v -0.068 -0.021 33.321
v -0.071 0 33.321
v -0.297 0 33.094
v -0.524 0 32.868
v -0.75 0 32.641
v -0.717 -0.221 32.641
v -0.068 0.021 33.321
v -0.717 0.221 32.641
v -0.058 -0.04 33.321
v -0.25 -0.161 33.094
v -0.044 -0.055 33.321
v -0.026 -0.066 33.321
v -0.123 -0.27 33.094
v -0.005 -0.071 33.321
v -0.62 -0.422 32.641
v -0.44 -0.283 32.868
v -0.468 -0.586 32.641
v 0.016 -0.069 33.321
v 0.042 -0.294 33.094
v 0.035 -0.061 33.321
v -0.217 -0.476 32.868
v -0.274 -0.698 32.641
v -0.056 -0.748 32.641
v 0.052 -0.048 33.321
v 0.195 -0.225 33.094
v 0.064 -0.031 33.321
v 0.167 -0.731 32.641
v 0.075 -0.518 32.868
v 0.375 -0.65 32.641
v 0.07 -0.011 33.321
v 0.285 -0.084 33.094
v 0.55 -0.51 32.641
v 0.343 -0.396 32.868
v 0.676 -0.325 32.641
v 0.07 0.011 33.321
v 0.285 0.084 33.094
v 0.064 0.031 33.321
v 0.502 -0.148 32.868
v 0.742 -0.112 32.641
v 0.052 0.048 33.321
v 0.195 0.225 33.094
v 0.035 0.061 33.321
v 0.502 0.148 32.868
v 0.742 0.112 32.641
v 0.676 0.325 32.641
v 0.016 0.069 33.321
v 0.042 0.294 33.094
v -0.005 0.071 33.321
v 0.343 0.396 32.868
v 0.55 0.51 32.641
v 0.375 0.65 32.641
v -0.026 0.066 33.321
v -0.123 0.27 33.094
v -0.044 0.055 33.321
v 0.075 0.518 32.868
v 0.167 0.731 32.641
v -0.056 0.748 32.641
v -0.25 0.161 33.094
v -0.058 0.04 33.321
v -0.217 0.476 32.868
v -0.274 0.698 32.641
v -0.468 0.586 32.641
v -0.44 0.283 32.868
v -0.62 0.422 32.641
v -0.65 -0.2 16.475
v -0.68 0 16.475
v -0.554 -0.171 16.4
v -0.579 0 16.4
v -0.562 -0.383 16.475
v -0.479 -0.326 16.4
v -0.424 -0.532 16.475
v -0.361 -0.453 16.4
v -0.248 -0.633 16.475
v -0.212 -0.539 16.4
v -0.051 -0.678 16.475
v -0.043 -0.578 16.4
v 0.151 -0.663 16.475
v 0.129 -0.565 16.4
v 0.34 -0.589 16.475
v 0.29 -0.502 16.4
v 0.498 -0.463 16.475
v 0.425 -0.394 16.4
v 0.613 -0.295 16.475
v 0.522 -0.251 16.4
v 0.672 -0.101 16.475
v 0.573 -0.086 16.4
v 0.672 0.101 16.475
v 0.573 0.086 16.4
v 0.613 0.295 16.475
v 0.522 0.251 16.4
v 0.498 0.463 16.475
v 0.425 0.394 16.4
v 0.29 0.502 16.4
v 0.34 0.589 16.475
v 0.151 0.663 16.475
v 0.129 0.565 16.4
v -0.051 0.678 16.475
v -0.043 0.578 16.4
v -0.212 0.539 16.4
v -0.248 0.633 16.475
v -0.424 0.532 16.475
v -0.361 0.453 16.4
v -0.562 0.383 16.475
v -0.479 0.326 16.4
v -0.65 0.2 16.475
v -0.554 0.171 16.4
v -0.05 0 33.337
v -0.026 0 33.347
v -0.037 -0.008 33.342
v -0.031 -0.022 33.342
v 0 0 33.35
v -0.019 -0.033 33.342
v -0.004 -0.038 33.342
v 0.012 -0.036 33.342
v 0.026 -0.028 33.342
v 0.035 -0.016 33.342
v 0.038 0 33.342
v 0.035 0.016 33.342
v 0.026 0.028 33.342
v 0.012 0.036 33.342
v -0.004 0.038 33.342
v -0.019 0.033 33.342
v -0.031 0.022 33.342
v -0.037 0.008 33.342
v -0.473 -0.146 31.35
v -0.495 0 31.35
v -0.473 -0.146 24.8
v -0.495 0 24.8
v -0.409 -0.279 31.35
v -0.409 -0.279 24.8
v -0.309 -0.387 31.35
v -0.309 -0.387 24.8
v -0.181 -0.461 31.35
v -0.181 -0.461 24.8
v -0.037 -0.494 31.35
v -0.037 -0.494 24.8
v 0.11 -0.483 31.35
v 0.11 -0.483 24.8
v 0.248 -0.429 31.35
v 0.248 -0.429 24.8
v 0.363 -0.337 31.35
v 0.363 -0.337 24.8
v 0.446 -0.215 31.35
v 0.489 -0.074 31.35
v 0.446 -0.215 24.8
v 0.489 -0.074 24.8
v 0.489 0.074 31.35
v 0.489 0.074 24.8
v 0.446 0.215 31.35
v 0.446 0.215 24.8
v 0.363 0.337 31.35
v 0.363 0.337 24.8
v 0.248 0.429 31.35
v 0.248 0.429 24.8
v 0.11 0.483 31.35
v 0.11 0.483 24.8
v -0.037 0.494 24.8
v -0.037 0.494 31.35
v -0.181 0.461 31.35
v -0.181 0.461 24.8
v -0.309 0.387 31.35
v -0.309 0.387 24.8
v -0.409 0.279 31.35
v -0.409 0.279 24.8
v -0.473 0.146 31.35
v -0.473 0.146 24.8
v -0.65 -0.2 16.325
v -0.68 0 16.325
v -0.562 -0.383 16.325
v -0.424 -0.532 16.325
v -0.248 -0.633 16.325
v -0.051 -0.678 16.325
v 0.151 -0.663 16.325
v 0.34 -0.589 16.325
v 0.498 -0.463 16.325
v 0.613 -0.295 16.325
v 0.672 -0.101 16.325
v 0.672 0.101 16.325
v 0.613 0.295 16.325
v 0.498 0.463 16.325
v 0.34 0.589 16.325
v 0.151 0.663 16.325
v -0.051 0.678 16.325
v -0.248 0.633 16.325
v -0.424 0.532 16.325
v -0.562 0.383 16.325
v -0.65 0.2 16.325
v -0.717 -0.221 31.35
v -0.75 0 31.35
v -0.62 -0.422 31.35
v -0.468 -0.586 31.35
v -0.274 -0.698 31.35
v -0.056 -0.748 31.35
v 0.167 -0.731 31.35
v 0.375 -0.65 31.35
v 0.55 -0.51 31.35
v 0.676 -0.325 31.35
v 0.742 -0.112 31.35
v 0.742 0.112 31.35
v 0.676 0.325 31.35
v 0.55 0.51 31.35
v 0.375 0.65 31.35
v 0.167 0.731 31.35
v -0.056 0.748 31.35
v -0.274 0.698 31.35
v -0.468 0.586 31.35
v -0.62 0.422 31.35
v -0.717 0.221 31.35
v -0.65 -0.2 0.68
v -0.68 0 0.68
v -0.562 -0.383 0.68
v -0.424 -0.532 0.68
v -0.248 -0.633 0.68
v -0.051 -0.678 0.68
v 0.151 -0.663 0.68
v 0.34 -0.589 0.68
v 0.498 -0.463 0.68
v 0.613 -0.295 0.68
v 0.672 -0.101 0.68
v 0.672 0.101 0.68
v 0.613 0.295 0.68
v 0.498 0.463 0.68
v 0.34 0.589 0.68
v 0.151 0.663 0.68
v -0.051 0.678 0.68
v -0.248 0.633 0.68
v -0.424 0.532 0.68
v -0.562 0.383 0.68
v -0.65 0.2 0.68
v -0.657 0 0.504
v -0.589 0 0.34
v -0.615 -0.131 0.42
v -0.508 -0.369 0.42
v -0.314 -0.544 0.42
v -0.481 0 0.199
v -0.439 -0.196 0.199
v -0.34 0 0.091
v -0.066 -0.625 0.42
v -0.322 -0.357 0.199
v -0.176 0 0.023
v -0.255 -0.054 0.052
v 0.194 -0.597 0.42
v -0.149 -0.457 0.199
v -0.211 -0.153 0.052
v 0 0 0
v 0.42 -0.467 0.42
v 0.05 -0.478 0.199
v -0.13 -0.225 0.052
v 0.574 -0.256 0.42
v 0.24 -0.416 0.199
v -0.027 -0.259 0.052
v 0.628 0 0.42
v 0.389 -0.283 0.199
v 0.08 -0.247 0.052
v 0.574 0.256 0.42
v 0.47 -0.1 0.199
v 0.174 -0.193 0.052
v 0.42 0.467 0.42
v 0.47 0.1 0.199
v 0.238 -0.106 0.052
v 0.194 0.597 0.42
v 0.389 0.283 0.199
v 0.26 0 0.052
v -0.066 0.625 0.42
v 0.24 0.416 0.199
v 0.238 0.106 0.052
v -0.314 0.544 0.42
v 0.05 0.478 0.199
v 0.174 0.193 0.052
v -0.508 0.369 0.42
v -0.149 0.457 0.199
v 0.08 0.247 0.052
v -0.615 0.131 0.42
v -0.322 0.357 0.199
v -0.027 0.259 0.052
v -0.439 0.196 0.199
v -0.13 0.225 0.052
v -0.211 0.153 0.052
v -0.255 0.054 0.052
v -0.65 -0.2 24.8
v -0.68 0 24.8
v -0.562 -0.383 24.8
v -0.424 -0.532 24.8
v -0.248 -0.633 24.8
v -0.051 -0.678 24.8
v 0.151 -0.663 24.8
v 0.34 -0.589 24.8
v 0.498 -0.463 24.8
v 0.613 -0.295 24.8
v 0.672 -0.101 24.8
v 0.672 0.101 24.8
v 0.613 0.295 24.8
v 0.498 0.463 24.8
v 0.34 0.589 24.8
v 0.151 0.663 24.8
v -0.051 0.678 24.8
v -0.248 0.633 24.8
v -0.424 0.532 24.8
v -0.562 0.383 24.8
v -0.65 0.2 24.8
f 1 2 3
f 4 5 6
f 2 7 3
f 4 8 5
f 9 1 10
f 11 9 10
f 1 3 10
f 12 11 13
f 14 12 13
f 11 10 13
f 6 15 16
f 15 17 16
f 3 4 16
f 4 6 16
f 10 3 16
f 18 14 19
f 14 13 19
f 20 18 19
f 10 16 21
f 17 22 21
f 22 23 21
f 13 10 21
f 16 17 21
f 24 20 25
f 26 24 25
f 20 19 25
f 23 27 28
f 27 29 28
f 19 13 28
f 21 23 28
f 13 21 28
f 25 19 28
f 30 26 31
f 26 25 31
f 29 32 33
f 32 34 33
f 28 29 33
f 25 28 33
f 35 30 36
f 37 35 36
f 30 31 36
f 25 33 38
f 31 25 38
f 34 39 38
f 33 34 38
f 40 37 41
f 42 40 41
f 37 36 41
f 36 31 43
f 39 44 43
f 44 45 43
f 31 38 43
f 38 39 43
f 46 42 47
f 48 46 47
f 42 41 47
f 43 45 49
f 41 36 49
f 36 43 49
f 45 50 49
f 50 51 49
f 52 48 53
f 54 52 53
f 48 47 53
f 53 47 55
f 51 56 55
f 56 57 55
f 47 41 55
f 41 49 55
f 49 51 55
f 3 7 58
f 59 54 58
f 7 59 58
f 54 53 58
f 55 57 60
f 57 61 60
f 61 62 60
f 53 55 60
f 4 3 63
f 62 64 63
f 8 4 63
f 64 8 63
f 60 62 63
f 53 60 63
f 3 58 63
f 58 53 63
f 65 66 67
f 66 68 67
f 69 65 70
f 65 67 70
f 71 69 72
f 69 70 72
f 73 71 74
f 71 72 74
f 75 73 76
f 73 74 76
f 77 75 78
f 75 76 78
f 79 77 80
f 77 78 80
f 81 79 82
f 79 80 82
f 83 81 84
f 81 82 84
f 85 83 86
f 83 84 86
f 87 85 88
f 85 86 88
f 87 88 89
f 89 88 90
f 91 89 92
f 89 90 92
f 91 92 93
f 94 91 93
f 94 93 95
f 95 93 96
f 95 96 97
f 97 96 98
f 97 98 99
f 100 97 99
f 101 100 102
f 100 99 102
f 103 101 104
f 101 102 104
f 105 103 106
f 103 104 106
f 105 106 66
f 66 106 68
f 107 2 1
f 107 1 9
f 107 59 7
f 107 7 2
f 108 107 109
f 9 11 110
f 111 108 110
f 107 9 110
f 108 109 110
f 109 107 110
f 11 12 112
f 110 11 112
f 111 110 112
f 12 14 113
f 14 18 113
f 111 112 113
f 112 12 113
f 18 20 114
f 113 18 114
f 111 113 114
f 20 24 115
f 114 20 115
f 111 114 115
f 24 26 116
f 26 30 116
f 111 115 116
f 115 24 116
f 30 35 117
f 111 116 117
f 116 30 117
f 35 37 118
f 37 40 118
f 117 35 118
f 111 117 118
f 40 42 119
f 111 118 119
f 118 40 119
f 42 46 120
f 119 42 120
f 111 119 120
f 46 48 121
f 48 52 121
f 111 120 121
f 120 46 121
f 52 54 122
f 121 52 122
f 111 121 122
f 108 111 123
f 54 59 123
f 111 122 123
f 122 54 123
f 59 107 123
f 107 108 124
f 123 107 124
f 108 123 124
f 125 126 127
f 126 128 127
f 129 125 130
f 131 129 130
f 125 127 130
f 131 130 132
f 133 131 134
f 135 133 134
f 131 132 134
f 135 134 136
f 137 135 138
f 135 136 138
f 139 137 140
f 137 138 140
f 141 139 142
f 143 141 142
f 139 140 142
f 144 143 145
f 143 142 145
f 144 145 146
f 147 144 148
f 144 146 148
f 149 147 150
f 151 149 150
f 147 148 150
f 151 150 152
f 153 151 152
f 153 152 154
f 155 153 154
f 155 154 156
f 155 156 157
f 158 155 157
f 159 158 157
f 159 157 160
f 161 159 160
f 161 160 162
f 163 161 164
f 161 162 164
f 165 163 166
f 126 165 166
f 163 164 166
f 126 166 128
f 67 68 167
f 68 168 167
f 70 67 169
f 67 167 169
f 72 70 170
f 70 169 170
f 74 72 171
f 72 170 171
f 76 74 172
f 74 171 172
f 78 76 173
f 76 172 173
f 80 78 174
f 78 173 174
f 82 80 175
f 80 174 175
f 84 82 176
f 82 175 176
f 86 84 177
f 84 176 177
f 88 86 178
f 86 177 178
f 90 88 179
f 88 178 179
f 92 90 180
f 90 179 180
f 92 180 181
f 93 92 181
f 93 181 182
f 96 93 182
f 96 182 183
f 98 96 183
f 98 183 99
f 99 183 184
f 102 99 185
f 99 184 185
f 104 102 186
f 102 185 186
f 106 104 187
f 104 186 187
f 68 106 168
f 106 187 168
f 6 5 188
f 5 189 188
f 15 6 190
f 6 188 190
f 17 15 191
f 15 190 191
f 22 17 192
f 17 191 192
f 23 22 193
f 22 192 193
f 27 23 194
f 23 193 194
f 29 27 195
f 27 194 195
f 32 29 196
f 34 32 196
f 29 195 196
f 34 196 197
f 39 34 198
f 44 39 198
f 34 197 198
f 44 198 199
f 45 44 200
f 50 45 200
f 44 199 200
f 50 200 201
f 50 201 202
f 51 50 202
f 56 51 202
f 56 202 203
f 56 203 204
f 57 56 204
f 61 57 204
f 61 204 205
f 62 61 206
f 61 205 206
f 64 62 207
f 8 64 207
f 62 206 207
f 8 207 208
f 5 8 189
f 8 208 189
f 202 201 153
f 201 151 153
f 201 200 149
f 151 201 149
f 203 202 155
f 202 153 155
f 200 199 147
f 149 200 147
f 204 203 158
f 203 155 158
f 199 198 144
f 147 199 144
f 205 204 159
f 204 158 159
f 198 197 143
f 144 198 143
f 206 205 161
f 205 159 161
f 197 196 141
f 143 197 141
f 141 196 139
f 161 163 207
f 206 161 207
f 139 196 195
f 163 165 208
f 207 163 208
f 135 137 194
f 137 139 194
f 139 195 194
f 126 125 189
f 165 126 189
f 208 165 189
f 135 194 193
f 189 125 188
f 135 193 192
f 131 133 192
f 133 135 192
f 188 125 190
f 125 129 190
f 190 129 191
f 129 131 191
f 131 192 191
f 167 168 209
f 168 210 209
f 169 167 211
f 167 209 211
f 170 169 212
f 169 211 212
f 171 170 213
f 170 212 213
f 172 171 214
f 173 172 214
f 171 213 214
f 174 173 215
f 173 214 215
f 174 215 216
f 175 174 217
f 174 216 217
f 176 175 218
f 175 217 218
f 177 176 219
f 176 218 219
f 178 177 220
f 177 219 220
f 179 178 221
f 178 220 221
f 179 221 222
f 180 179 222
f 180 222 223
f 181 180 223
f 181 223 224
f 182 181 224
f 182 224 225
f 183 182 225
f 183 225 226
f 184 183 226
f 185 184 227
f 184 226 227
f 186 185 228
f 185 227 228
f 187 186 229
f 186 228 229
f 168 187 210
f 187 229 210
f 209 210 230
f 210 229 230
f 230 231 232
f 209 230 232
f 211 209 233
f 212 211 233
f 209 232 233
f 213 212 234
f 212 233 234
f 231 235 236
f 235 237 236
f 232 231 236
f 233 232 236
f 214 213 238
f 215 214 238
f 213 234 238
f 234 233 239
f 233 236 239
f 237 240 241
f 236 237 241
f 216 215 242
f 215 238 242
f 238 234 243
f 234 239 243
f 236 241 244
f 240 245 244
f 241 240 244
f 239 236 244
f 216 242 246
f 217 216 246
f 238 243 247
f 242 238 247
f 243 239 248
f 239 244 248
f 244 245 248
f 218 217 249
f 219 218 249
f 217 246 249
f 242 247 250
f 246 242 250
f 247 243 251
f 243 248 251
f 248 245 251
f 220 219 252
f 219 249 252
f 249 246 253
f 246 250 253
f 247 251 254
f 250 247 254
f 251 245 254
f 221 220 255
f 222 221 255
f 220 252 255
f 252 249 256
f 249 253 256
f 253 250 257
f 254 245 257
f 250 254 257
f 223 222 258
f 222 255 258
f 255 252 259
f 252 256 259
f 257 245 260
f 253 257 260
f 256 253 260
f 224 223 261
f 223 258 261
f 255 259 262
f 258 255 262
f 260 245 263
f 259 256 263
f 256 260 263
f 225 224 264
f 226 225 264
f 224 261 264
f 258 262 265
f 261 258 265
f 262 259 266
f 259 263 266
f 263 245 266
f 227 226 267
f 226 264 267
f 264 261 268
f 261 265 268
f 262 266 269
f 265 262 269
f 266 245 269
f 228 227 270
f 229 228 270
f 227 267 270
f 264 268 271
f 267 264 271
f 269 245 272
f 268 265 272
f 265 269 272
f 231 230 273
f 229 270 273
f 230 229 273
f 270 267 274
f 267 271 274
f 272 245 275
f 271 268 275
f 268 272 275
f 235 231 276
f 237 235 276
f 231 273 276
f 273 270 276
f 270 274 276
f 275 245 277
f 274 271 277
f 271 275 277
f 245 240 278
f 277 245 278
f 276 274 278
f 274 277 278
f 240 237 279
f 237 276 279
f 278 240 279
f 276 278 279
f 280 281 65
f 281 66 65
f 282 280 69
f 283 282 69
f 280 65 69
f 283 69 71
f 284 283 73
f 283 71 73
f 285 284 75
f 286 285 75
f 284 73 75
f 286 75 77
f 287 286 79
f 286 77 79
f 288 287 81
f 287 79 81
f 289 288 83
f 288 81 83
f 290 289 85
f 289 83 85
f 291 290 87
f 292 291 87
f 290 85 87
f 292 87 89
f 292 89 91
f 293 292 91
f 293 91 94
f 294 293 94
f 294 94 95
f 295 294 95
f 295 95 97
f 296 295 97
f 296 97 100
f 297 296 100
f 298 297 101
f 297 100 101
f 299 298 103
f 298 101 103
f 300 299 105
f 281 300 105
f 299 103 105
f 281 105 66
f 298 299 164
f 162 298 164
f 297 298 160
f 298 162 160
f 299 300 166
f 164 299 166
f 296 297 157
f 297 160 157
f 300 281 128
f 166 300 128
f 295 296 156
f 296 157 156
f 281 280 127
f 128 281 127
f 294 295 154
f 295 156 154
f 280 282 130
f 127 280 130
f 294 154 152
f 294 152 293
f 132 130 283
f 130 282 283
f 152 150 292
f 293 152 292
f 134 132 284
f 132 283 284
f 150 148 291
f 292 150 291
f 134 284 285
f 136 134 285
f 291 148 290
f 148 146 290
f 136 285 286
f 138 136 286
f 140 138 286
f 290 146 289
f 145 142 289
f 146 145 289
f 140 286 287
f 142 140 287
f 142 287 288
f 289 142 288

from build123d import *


with BuildPart() as part:
    # Эскиз1 → Повернуть1 (revolve)
    with BuildSketch(Plane(origin=(0, 0, 0), x_dir=(1, 0, 0), z_dir=(0, 1, 0))):
        with BuildLine():
            Line((0, 0), (0, -33.35))
            ThreePointArc((0, -33.35), (-0.038268343, -33.342387953), (-0.070710678, -33.320710678))
            Line((-0.070710678, -33.320710678), (-0.75, -32.641421356))
            Line((-0.75, -32.641421356), (-0.75, -31.35))
            Line((-0.75, -31.35), (-0.495, -31.35))
            Line((-0.495, -31.35), (-0.495, -24.8))
            Line((-0.495, -24.8), (-0.68, -24.8))
            Line((-0.68, -24.8), (-0.68, -16.475))
            Line((-0.68, -16.475), (-0.579289322, -16.4))
            Line((-0.579289322, -16.4), (-0.68, -16.325))
            Line((-0.68, -16.325), (-0.68, -0.68))
            ThreePointArc((-0.68, -0.68), (-0.480832611, -0.199167389), (0, 0))
        make_face()
    revolve(axis=Axis((0, 0, 0), (0, 0, 1)))


solid = part.part
